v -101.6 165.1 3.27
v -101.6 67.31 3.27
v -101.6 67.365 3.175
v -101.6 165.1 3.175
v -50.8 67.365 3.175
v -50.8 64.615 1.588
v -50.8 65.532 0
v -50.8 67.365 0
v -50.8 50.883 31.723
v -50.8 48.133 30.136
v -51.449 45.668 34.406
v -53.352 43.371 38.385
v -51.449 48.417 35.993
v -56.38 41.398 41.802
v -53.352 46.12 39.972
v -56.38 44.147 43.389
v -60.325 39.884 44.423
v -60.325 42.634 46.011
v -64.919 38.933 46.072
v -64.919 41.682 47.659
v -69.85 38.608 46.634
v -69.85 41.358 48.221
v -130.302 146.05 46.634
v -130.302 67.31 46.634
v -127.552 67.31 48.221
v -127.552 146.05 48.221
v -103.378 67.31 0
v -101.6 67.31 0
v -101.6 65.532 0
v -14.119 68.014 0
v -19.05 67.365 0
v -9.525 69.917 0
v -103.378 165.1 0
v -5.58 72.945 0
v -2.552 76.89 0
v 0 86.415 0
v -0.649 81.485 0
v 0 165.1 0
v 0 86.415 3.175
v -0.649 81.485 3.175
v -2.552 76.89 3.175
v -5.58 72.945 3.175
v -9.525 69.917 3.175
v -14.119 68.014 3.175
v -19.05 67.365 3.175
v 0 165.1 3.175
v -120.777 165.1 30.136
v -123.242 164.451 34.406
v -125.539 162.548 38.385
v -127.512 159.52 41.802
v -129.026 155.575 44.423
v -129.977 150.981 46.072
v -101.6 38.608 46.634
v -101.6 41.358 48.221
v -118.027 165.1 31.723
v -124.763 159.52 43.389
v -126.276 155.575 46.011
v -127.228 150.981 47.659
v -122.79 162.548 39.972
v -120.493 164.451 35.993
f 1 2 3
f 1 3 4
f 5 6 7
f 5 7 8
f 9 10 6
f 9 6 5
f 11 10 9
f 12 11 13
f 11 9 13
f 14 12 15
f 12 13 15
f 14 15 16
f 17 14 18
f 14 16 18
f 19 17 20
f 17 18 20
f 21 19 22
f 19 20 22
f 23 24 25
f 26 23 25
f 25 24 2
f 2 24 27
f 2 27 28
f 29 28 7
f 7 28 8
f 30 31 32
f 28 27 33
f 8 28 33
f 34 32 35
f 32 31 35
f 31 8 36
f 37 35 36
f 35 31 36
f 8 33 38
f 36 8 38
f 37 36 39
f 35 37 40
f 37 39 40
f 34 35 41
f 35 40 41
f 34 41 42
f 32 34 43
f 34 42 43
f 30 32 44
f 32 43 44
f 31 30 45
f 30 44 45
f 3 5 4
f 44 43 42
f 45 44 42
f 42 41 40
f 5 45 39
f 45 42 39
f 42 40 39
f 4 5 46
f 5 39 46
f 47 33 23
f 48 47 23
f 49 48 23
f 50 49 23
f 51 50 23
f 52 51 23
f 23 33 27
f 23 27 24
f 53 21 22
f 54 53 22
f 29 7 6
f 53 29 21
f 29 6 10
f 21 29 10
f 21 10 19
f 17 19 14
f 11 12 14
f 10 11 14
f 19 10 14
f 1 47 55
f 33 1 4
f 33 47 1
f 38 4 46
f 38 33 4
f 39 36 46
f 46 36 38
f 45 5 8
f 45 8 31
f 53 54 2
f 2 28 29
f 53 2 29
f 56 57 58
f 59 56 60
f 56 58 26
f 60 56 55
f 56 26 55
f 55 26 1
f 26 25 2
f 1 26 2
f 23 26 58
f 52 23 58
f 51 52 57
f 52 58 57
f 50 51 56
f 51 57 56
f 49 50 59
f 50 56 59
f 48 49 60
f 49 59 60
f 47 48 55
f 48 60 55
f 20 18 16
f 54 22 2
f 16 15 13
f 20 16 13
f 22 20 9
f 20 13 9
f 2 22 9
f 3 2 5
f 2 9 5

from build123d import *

# Parameters (mm, degrees)
F0_W      = 152.4
F0_H      = 165.1
F1_DEPTH  = 50.8
F3_DEPTH  = 101.6
F5_DEPTH  = 165.101
F7_DEPTH  = 25.4
F8_W      = 5.535897017
F8_H      = 67.31
F9_DEPTH  = 48.222235943
F11_DEPTH = 25.4
F13_DEPTH = 25.4
F14_W     = 60.9961288601
F14_H     = 11.3769355246
F15_DEPTH = 50.8


with BuildPart() as f1:
    # F0 (on Top) → F1 (new body)
    with BuildSketch(Plane.XY):
        with Locations((-76.2, 82.55)):
            Rectangle(F0_W, F0_H)
    extrude(amount=F1_DEPTH)

    # F2 (on face) → F3 (cut)
    with BuildSketch(Plane.YZ):
        Polygon((0, 0), (65.532, 0), (38.608, 46.633735943), (41.357630657, 48.221235943), (67.3650871047, 3.175), (165.1, 3.175), (165.1, 50.8), (0, 50.8), align=None)
    extrude(amount=-F3_DEPTH, mode=Mode.SUBTRACT)

    # F4 (on face) → F5 (cut, through all)
    with BuildSketch(Plane.XZ):
        Polygon((-127.552369343, 48.221235943), (-101.6, 3.2704136641), (-101.6, 50.8), (-152.4, 50.8), (-152.4, 0), (-103.378, 0), (-130.302, 46.633735943), align=None)
    extrude(amount=-F5_DEPTH, mode=Mode.SUBTRACT)

    # F6 (on face) → F7 (cut)
    with BuildSketch(Plane(origin=(-74.783869343, 0, -43.1764870962), x_dir=(0, 1, 0), z_dir=(0.8660254038, 0, 0.5))):
        with BuildLine():
            Line((165.1, 105.537), (146.05, 105.537))
            ThreePointArc((146.05, 105.537), (159.5203841816, 99.9573841816), (165.1, 86.487))
            Line((165.1, 86.487), (165.1, 105.537))
        make_face()
        Polygon((67.31, 105.537), (0, 105.537), (0, 53.632261314), (63.6438257906, 53.632261314), (67.31, 53.632261314), align=None)
    extrude(amount=-F7_DEPTH, mode=Mode.SUBTRACT)

    # F8 (on face) → F9 (cut, through all)
    with BuildSketch(Plane(origin=(0, 0, 0), x_dir=(1, 0, 0), z_dir=(0, 0, -1))):
        with Locations((-106.1459485085, -33.655)):
            Rectangle(F8_W, F8_H)
        Polygon((-101.6, -65.532), (-101.6, 0), (-103.378, 0), (-103.378, -67.31), (-101.6, -67.31), align=None)
    extrude(amount=-F9_DEPTH, mode=Mode.SUBTRACT)

    # F10 (on face) → F11 (cut)
    with BuildSketch(Plane(origin=(0, 51.898630657, 29.9636883804), x_dir=(-1, 0, 0), z_dir=(0, 0.8660254038, 0.5))):
        with BuildLine():
            ThreePointArc((50.8, 2.032), (56.3796158184, 15.5023841816), (69.85, 21.082))
            Line((69.85, 21.082), (0, 21.082))
            Line((0, 21.082), (0, -30.9329128953))
            Line((0, -30.9329128953), (50.8, -30.9329128953))
            Line((50.8, -30.9329128953), (50.8, 2.032))
        make_face()
    extrude(amount=-F11_DEPTH, mode=Mode.SUBTRACT)

    # F12 (on face) → F13 (cut)
    with BuildSketch(Plane.XY.offset(3.175)):
        with BuildLine():
            Line((0, 67.3650871047), (0, 86.4150871047))
            ThreePointArc((0, 86.4150871047), (-5.5796158184, 72.9447029231), (-19.05, 67.3650871047))
            Line((-19.05, 67.3650871047), (0, 67.3650871047))
        make_face()
    extrude(amount=-F13_DEPTH, mode=Mode.SUBTRACT)

    # F14 (on face) → F15 (cut)
    with BuildSketch(Plane.XY.offset(3.175)):
        with Locations((-20.3019355699, 61.6766193424)):
            Rectangle(F14_W, F14_H)
    extrude(amount=-F15_DEPTH, mode=Mode.SUBTRACT)


solid = f1.part
